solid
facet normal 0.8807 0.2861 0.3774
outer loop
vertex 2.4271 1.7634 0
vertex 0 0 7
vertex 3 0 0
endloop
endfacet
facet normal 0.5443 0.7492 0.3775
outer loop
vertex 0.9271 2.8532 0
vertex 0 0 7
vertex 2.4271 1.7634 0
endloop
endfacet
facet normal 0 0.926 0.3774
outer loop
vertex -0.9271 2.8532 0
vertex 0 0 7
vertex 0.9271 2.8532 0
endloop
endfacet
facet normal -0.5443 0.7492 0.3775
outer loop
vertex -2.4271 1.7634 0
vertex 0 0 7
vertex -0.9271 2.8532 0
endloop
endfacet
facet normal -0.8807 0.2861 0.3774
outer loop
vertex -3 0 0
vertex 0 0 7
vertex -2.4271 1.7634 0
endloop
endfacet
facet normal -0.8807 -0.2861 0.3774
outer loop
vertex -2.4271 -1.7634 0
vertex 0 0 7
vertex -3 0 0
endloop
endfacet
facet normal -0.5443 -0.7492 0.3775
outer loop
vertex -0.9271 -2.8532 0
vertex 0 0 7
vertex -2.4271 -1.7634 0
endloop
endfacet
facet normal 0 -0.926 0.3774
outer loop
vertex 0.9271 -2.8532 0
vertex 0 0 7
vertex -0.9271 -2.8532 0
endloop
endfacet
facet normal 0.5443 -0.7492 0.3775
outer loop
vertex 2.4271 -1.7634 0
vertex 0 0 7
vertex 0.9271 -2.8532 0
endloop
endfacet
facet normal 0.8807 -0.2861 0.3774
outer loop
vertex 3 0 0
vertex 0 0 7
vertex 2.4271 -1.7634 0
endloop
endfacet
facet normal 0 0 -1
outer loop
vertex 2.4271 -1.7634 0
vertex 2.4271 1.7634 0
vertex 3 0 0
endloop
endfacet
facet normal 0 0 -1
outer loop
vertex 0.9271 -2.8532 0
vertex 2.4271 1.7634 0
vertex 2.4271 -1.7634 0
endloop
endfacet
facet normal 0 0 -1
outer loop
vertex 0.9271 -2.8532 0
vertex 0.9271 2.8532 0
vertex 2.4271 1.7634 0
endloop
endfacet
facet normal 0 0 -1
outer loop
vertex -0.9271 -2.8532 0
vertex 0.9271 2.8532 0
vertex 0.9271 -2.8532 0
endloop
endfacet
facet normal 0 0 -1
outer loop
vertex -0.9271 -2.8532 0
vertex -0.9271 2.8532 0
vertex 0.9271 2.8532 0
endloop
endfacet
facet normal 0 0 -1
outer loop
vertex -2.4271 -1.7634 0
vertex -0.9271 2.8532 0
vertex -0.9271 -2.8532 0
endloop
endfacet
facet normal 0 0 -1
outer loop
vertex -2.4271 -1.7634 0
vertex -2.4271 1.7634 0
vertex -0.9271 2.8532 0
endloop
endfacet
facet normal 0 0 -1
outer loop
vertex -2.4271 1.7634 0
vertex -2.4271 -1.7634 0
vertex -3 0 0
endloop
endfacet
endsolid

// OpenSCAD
// Generated by SolidPython 1.0.1 on 2020-07-29 00:46:43


cylinder(h = 7, r1 = 3, r2 = 0);
/***********************************************
*********      SolidPython code:      **********
************************************************
 
# import packages: SolidPython
from solid import *
from solid.utils import *
from itertools import chain, combinations, permutations


class Resize:

    def __init__(self, scad_file):
        self.scad_file = scad_file
        #self.scad_file = import_scad(scad_file)
        # cone/cylinder param:
        self.r1 = 0
        self.r2 = 0
        self.h = 0
        # rectangular prism param:
        self.w = 0
        self.l = 0
        # ellipse param:
        self.r = 0

    # import OpenScad code (file name corresponds to shape)


    # classify shape + parameters
    def assign(self, param1, param2, param3):
        if self.scad_file == 'cone.scad':
            self.r1 = param1
            self.r2 = param2
            self.h = param3
        elif self.scad_file == 'cylinder.scad':
            self.r1 = param1
            self.r2 = param2
            self.h = param3
        elif self.scad_file == 'rectangularPrism.scad':
            self.h = param1
            self.l = param2
            self.w = param3
        else:
            self.r = param1
            self.h = param2

    # resize parameters
    def iterate(self):
        x = range(3, 20, 2)
        i = 1
        if self.scad_file == 'cone.scad':
            tempList = list(permutations(x, 2))
            for temp in tempList:
                param1 = temp[0]
                param2 = temp[1]
                filepath = 'produced_scad_files/' + 'cone' + str(param1) + '_' + str(param2) + '_' + '.scad'
                scad_render_to_file(cylinder(h=param1, r1=param2, r2=0), filepath)

        elif self.scad_file == 'cylinder.scad':
            tempList = list(permutations(x, 3))
            for temp in tempList:
                param1 = temp[0]
                param2 = temp[1]
                filepath = 'produced_scad_files/' + 'cylinder' + str(param1) + '_' + str(param2) + '_' + '.scad'
                scad_render_to_file(cylinder(h=param1, r1=param2, r2=param2), filepath)

        elif self.scad_file == 'rectangularPrism.scad':
            tempList = list(permutations(x, 3))
            for temp in tempList:
                param1 = temp[0]
                param2 = temp[1]
                param3 = temp[2]
                filepath = 'produced_scad_files/' + 'rectangularPrism' + str(param1) + '_' + str(param2) + '_' + str(
                    param3) + '.scad'
                scad_render_to_file(cube(size=(param1, param2, param3)), filepath)

        elif self.scad_file == 'ellipse.scad':
            tempList = list(permutations(x, 4))
            for temp in tempList:
                param1 = temp[0]
                param2 = temp[1]
                param3 = temp[2]
                param4 = temp[3]
                filepath = 'produced_scad_files/' + 'ellipse' + str(param1) + '_' + str(param2) + '_' + str(param3) + '_' + str(param4) + '.scad'
                scad_render_to_file(scale([param1, param2, param3])(sphere(r=param4)), filepath)

    def render_to_scadfile(self):
        scad_render_to_file(scad, 'example.scad') 
 
************************************************/
